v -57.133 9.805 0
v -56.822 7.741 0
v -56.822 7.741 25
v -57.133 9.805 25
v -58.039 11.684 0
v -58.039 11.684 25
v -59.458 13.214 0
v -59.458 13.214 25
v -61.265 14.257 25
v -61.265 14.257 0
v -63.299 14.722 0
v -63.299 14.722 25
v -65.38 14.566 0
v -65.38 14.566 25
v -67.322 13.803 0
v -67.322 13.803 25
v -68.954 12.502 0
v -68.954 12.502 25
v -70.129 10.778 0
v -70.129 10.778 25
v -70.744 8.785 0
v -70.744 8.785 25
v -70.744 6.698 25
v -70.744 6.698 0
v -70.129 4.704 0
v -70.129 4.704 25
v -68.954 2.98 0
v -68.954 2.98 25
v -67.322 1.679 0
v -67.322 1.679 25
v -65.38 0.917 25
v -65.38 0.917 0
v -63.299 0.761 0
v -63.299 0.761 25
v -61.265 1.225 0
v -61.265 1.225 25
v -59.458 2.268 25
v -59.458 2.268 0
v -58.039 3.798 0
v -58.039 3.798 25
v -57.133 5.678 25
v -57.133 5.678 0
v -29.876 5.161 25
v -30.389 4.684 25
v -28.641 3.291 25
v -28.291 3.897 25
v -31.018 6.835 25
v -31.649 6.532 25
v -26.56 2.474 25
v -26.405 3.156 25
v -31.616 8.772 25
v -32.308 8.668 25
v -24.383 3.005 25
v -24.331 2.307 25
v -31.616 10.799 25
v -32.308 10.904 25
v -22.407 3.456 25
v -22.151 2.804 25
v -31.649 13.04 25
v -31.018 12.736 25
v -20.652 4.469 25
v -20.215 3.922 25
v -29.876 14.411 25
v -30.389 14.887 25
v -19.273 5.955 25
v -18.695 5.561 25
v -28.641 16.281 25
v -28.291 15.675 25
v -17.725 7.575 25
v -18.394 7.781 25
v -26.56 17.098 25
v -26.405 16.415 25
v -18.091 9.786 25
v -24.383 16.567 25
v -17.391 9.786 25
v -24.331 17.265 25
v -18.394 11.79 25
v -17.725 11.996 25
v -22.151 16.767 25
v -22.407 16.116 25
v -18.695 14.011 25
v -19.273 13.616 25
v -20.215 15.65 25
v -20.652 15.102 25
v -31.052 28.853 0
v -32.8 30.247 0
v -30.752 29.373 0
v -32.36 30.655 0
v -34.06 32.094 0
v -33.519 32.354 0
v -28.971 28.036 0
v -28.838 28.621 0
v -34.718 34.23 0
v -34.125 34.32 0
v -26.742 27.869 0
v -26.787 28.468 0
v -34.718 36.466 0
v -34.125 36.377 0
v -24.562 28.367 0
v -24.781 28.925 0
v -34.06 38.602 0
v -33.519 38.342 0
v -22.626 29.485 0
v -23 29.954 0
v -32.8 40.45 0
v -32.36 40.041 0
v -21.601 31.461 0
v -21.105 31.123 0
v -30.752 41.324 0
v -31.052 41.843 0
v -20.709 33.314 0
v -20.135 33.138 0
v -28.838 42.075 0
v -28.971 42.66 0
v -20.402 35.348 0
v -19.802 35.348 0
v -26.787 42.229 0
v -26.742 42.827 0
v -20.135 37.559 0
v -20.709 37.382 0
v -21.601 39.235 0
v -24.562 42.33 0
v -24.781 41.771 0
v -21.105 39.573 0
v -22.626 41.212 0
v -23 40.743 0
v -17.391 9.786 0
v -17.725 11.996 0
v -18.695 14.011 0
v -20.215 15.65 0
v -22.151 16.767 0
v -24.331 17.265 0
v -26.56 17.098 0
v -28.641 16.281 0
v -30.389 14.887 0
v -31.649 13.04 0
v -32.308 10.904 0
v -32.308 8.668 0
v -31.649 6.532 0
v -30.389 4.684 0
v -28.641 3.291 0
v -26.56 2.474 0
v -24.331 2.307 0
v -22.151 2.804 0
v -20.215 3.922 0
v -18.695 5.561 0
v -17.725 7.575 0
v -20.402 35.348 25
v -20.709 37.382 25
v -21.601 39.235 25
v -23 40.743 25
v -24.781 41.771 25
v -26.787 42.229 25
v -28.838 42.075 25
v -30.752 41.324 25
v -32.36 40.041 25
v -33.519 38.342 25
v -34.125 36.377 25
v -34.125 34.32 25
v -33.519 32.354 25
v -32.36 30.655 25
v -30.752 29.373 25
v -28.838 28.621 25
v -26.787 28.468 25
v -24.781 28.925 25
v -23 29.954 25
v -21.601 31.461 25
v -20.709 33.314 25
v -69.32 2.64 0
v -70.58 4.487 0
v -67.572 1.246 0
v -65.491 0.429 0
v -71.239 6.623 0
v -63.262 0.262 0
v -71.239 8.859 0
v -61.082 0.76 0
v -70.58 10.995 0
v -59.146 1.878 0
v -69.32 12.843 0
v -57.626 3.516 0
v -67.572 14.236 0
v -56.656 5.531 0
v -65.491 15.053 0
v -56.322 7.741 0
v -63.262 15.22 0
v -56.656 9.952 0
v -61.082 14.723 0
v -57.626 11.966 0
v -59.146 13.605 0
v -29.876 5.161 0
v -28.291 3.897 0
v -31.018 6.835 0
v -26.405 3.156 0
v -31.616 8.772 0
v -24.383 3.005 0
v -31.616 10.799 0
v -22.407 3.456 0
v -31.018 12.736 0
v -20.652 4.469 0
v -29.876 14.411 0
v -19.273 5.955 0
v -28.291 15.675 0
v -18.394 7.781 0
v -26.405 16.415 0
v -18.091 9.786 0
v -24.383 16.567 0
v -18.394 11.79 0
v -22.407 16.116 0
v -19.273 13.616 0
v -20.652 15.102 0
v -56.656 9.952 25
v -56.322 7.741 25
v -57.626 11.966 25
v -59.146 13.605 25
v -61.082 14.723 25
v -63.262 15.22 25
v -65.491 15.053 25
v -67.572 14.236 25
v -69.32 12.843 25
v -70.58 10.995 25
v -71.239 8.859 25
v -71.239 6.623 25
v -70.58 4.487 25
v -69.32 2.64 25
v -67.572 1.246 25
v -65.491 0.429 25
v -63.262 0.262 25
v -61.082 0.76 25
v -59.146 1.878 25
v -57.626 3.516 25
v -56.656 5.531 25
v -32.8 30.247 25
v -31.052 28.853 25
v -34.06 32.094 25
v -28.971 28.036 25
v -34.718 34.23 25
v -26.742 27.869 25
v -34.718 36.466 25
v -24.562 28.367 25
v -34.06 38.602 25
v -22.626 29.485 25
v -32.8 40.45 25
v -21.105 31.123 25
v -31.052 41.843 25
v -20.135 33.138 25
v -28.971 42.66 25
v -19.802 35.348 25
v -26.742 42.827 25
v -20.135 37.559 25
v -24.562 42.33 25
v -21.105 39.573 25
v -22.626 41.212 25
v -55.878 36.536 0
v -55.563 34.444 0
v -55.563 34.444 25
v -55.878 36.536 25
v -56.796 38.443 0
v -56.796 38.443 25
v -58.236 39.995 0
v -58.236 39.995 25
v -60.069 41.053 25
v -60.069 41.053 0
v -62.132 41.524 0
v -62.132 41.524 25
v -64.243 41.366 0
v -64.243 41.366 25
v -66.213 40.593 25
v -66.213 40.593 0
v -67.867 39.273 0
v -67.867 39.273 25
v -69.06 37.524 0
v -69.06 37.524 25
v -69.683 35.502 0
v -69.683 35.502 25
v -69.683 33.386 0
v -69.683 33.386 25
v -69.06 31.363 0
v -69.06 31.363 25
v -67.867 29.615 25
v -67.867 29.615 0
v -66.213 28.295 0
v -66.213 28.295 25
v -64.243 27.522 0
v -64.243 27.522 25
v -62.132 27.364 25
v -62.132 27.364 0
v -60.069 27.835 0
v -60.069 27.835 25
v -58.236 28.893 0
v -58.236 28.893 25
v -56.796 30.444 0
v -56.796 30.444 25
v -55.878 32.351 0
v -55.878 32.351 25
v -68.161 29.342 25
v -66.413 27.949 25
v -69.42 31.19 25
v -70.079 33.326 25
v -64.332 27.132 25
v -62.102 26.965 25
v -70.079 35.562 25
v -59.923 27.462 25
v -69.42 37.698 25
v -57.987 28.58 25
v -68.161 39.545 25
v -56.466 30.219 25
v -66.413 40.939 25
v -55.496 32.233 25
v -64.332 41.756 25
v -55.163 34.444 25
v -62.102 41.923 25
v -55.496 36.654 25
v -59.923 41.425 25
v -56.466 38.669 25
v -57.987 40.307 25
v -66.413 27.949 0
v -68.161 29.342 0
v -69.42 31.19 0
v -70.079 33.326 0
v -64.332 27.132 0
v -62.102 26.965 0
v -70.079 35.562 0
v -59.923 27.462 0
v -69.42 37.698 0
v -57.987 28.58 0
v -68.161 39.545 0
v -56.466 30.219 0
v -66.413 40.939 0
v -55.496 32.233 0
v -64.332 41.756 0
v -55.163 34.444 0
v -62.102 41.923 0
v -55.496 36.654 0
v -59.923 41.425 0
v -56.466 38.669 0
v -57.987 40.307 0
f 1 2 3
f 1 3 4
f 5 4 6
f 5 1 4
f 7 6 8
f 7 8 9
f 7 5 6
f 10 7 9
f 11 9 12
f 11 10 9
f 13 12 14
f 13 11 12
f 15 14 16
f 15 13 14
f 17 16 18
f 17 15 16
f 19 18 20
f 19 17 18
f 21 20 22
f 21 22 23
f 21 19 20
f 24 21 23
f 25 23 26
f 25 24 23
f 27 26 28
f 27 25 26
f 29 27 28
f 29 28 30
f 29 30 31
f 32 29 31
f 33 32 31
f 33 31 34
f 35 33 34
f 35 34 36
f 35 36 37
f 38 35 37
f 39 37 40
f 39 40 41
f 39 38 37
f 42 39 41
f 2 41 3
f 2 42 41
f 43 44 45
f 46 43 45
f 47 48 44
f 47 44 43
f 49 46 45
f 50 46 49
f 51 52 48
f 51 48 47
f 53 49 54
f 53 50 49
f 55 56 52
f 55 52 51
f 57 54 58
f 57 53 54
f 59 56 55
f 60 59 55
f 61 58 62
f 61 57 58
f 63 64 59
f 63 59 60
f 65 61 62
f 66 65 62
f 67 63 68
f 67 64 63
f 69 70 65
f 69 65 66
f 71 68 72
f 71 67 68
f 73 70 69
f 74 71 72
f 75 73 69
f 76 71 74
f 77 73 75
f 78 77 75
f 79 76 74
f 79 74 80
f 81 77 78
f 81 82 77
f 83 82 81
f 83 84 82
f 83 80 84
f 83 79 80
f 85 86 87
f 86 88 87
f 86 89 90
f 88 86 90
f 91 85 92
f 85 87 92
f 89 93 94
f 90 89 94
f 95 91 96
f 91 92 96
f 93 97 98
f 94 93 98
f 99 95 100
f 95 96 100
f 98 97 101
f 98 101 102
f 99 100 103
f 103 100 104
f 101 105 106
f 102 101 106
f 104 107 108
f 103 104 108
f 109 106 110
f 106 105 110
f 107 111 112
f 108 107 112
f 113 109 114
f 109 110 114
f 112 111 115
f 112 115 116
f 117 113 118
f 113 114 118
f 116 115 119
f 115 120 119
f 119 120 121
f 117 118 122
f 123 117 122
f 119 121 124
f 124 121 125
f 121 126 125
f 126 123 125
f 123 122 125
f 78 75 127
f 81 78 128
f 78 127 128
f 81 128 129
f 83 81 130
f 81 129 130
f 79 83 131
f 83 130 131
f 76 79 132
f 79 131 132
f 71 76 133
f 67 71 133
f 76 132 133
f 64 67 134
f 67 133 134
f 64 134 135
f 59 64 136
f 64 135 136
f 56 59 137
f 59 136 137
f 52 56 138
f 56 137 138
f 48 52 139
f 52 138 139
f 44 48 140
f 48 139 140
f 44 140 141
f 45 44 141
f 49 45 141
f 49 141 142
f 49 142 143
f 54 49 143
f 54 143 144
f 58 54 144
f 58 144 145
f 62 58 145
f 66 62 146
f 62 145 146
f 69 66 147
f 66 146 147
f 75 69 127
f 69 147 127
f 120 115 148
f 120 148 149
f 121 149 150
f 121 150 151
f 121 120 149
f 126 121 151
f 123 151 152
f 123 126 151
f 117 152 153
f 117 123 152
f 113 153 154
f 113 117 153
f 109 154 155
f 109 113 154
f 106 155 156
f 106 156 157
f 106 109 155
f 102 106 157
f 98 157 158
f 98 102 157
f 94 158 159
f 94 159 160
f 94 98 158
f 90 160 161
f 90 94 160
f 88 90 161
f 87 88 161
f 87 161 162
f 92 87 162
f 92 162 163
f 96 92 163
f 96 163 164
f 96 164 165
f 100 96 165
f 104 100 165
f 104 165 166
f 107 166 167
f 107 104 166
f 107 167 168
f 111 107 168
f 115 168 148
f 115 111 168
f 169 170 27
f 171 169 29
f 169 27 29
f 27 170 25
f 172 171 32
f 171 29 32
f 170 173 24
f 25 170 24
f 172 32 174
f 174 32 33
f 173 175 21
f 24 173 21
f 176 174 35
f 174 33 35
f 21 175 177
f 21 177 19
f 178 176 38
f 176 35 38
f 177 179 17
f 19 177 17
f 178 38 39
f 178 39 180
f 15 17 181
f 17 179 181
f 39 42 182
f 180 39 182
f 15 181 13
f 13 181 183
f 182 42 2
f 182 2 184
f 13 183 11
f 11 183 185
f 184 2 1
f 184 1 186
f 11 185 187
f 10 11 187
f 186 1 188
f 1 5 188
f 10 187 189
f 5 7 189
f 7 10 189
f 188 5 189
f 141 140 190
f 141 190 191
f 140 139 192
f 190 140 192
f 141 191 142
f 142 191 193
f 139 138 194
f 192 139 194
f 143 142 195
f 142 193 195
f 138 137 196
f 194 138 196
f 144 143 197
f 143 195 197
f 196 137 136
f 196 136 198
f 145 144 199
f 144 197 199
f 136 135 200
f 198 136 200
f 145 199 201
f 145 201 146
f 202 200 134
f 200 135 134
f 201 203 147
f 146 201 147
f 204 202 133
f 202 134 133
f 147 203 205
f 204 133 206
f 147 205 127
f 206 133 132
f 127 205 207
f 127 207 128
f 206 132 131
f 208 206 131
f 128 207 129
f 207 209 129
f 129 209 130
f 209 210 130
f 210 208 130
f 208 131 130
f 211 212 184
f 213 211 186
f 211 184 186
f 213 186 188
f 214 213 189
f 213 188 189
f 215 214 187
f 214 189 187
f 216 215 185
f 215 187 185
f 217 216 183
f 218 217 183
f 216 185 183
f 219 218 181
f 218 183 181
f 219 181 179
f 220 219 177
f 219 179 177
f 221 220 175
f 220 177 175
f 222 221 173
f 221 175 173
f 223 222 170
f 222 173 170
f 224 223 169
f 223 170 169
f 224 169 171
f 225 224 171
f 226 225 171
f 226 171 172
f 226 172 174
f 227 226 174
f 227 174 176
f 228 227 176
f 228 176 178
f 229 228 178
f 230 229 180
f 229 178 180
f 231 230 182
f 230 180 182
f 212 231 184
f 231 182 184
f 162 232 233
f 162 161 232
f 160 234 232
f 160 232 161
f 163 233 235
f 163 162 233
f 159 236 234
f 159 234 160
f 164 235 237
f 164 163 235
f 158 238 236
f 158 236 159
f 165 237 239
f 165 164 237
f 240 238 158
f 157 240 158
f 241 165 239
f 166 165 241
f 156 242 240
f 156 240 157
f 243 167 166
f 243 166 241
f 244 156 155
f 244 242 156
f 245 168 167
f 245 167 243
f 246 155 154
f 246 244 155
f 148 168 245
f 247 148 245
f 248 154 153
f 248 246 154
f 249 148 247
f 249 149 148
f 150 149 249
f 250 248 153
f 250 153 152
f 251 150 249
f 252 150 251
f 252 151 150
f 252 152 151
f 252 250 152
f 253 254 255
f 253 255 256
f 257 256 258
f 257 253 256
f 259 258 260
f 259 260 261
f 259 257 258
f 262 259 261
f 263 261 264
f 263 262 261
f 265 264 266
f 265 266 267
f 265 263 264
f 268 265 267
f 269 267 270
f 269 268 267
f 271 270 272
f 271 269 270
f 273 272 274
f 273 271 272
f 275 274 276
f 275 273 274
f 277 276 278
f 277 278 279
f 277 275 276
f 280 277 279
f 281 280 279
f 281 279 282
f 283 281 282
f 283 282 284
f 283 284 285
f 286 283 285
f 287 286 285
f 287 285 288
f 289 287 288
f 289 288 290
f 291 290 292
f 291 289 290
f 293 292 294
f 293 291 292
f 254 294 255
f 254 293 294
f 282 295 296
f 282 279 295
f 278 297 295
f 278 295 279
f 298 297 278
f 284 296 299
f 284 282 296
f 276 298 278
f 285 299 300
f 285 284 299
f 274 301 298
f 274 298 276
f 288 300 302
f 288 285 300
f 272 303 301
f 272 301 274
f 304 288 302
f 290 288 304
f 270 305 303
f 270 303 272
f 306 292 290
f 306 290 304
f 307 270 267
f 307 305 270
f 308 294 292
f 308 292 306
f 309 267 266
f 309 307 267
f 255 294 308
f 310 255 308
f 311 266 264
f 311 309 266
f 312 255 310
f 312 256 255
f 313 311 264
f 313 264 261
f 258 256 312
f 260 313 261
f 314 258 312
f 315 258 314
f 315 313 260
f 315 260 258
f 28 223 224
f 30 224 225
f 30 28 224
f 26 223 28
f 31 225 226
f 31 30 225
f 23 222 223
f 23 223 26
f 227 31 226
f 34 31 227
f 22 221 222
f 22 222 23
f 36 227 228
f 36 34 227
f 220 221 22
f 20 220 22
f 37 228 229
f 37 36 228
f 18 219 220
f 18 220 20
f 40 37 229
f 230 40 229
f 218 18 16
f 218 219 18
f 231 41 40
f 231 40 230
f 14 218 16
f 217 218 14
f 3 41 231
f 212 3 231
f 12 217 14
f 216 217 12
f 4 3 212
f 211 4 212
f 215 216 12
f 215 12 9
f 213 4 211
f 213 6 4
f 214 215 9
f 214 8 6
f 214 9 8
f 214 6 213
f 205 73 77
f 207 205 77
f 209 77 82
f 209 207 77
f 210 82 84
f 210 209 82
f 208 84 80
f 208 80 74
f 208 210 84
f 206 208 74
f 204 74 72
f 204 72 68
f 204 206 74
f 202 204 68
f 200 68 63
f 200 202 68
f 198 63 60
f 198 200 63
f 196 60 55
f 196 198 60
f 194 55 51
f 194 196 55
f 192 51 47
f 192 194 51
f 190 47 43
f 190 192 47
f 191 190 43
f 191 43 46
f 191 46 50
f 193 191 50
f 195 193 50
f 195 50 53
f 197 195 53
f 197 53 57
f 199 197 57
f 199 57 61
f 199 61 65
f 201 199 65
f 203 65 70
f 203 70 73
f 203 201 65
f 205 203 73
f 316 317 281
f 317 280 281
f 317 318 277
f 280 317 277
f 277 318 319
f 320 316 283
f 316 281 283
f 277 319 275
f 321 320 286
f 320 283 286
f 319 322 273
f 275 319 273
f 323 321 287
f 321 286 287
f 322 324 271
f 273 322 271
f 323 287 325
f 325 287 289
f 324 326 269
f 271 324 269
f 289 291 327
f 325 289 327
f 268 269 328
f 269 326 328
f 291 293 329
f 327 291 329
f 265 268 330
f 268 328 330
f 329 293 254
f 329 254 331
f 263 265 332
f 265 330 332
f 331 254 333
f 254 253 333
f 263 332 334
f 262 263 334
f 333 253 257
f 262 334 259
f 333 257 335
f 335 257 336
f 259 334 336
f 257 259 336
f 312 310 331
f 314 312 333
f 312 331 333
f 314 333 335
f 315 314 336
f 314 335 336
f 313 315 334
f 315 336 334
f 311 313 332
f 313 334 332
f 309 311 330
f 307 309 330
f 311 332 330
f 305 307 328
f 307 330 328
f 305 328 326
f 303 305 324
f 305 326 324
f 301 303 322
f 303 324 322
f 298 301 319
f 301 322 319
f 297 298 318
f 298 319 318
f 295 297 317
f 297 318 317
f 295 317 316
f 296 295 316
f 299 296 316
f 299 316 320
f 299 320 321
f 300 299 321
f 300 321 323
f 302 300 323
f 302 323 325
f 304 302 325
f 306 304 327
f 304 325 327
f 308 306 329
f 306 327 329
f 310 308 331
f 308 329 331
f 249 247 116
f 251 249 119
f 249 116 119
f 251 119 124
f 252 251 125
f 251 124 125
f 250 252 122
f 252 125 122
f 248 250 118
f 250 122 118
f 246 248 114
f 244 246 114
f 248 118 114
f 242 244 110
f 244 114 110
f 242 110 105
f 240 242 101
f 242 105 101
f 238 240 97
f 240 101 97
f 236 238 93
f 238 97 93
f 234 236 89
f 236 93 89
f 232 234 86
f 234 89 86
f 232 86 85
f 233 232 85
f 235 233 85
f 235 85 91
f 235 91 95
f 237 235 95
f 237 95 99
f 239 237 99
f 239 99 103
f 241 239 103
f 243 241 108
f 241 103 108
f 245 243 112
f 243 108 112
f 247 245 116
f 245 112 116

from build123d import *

# Parameters (mm, degrees)
F0_R     = 7.5
F0_R_2   = 7.1
F0_R_3   = 7
F0_R_4   = 6.9
F0_R_5   = 6.8
F1_DEPTH = 25


with BuildPart() as f1:
    # F0 (on Top) → F1 (new body)
    with BuildSketch(Plane.XY):
        with Locations((-62.662691, 34.443732)):
            Circle(F0_R)
        with Locations((-62.662691, 34.443732)):
            Circle(F0_R_2, mode=Mode.SUBTRACT)
        with Locations((-63.822366, 7.741257)):
            Circle(F0_R)
        with Locations((-63.822366, 7.741257)):
            Circle(F0_R_3, mode=Mode.SUBTRACT)
        with Locations((-27.302256, 35.348251)):
            Circle(F0_R)
        with Locations((-27.302256, 35.348251)):
            Circle(F0_R_4, mode=Mode.SUBTRACT)
        with Locations((-24.891498, 9.785793)):
            Circle(F0_R)
        with Locations((-24.891498, 9.785793)):
            Circle(F0_R_5, mode=Mode.SUBTRACT)
    extrude(amount=F1_DEPTH)


solid = f1.part
